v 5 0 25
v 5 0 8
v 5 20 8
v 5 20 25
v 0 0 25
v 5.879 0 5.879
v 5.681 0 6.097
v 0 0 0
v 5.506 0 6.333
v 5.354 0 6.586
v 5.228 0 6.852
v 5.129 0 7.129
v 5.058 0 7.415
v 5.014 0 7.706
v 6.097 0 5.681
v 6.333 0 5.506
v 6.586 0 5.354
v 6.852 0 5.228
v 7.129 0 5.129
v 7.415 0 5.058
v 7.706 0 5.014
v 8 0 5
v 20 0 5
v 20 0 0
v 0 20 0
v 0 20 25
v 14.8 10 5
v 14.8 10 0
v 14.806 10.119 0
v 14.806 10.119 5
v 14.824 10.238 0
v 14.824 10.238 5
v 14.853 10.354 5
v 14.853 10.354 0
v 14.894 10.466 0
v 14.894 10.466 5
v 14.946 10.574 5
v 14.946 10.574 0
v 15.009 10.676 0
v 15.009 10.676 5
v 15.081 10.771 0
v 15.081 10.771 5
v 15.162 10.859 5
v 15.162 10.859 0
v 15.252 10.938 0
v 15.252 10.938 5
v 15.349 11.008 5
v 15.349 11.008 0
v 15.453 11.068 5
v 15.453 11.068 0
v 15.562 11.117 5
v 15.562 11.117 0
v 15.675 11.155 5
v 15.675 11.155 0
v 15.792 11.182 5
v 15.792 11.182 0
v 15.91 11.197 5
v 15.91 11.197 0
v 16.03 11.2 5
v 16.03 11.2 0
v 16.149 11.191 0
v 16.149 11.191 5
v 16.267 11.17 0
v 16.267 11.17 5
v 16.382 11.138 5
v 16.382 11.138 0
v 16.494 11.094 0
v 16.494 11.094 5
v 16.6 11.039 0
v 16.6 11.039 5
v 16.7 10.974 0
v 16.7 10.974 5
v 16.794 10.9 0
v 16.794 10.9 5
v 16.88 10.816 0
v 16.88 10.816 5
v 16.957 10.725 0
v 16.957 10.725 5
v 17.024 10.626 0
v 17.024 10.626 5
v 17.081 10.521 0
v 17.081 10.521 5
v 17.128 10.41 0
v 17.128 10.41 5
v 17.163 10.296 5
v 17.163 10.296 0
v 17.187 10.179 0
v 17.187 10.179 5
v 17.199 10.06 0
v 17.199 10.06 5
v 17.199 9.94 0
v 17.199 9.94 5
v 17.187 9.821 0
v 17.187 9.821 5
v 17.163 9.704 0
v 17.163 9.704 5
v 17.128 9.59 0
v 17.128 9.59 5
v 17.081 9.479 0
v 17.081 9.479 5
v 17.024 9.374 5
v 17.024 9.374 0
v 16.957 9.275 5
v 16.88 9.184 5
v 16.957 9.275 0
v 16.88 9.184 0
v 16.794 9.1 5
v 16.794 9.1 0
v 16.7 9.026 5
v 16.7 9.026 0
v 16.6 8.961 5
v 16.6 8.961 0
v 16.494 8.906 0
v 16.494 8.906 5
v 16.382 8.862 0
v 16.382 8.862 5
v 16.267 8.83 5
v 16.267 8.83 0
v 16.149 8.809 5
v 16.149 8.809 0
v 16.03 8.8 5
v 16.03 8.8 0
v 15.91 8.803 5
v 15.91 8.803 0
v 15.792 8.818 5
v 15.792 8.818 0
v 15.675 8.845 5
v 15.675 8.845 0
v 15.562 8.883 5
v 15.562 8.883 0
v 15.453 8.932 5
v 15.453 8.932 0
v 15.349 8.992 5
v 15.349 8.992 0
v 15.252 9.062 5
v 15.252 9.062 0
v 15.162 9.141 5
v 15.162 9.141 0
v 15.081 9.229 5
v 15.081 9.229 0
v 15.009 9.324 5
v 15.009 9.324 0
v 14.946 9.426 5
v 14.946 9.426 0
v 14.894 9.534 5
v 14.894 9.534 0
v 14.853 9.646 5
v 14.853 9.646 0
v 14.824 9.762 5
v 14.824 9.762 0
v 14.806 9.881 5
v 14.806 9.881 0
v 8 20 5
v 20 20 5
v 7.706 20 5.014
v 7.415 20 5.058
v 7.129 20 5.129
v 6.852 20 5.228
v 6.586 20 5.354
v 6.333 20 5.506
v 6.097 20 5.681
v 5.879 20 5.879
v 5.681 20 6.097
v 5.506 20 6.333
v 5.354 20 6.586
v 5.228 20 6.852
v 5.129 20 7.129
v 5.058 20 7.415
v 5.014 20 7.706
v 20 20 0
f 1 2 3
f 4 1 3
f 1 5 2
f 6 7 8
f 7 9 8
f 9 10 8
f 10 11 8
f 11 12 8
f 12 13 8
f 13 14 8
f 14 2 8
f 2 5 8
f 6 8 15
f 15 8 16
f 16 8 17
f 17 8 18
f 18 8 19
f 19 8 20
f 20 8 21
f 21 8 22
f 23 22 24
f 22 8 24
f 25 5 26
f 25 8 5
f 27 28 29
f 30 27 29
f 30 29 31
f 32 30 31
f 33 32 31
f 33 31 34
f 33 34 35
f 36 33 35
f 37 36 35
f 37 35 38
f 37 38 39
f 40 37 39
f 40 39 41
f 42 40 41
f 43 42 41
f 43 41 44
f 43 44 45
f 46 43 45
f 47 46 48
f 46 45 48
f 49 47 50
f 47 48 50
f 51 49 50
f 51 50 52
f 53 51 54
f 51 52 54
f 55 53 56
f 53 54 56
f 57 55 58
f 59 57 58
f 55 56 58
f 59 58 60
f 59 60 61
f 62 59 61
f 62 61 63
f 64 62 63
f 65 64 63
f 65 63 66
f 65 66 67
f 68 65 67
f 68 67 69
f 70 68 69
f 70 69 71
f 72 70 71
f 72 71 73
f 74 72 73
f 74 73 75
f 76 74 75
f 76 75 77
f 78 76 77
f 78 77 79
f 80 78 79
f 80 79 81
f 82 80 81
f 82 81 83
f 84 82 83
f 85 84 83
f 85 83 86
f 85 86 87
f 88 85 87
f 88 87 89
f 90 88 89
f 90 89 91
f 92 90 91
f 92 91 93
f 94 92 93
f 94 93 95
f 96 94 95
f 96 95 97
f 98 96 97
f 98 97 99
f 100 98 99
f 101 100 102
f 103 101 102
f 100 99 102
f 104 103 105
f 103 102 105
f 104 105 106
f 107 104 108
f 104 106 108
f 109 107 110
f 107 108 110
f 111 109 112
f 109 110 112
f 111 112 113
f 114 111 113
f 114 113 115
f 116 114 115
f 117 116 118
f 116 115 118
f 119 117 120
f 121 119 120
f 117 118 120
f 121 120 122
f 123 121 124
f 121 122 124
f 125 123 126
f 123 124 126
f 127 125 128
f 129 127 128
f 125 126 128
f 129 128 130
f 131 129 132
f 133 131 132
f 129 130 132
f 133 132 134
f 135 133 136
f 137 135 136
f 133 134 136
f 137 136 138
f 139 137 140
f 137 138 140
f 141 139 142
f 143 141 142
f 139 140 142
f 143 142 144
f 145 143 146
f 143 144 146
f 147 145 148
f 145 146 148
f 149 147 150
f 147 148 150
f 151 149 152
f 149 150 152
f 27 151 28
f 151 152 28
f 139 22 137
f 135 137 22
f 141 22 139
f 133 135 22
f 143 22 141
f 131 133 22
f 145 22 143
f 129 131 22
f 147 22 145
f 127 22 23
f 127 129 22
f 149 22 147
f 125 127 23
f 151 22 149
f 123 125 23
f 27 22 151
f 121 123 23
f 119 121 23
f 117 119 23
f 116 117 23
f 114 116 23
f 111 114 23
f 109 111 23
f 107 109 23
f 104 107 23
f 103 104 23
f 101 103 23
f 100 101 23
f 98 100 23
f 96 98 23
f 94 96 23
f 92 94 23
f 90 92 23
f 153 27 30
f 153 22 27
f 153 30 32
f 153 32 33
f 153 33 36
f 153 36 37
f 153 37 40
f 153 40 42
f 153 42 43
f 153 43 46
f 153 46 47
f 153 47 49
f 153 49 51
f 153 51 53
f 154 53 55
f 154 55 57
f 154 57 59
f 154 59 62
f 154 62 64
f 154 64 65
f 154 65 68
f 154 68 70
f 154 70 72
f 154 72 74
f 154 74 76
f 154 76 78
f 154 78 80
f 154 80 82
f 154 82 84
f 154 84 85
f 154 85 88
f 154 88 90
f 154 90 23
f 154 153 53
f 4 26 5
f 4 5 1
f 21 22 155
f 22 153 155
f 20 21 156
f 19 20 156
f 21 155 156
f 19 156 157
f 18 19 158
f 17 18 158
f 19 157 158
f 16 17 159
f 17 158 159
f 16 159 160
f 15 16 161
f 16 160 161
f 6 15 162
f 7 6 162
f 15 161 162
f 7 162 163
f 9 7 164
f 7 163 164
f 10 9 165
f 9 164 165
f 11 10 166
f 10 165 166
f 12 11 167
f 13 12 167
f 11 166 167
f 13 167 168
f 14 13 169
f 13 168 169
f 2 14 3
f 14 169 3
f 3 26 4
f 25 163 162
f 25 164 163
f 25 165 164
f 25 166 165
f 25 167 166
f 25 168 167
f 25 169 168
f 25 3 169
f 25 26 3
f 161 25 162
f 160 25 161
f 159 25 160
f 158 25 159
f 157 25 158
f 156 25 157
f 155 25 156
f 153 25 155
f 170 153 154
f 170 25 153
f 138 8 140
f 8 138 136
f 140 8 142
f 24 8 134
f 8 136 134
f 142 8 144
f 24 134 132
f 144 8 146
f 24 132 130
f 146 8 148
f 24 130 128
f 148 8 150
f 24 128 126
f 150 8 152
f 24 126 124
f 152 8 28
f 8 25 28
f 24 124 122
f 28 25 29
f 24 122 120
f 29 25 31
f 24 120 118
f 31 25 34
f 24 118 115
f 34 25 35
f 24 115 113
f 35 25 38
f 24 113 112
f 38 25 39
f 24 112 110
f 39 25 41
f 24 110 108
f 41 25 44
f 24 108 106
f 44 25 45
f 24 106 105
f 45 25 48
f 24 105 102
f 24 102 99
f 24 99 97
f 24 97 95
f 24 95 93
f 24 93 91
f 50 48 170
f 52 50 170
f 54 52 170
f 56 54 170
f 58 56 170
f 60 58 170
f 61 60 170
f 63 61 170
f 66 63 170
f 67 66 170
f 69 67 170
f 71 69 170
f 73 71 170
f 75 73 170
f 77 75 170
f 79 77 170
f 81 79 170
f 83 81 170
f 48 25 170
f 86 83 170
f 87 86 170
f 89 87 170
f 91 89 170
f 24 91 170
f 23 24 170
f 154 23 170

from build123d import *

# Parameters (mm, degrees)
SKETCH1_W           = 20
SKETCH1_H           = 20
BOSS_EXTRUDE1_DEPTH = 5
SKETCH2_W           = 5
SKETCH2_H           = 20
BOSS_EXTRUDE2_DEPTH = 20
FILLET1_R           = 3
SKETCH3_R           = 1.2
CUT_EXTRUDE1_DEPTH  = 20


with BuildPart() as part:
    # Sketch1 → Boss-Extrude1 (new body)
    with BuildSketch(Plane.XY):
        with Locations((10, 10)):
            Rectangle(SKETCH1_W, SKETCH1_H)
    extrude(amount=BOSS_EXTRUDE1_DEPTH)

    # Sketch2 → Boss-Extrude2 (add)
    with BuildSketch(Plane.XY.offset(5)):
        with Locations((2.5, 10)):
            Rectangle(SKETCH2_W, SKETCH2_H)
    extrude(amount=BOSS_EXTRUDE2_DEPTH)

    # Fillet1
    fillet1_edges = [part.edges().sort_by_distance(p)[0] for p in [
        (5, 10, 5),
    ]]
    fillet(fillet1_edges, radius=FILLET1_R)

    # Sketch3 → Cut-Extrude1 (cut)
    with BuildSketch(Plane(origin=(0, 0, 0), x_dir=(-1, 0, 0), z_dir=(0, 0, -1))):
        with Locations((-16, 10)):
            Circle(SKETCH3_R)
    extrude(amount=-CUT_EXTRUDE1_DEPTH, mode=Mode.SUBTRACT)


solid = part.part
